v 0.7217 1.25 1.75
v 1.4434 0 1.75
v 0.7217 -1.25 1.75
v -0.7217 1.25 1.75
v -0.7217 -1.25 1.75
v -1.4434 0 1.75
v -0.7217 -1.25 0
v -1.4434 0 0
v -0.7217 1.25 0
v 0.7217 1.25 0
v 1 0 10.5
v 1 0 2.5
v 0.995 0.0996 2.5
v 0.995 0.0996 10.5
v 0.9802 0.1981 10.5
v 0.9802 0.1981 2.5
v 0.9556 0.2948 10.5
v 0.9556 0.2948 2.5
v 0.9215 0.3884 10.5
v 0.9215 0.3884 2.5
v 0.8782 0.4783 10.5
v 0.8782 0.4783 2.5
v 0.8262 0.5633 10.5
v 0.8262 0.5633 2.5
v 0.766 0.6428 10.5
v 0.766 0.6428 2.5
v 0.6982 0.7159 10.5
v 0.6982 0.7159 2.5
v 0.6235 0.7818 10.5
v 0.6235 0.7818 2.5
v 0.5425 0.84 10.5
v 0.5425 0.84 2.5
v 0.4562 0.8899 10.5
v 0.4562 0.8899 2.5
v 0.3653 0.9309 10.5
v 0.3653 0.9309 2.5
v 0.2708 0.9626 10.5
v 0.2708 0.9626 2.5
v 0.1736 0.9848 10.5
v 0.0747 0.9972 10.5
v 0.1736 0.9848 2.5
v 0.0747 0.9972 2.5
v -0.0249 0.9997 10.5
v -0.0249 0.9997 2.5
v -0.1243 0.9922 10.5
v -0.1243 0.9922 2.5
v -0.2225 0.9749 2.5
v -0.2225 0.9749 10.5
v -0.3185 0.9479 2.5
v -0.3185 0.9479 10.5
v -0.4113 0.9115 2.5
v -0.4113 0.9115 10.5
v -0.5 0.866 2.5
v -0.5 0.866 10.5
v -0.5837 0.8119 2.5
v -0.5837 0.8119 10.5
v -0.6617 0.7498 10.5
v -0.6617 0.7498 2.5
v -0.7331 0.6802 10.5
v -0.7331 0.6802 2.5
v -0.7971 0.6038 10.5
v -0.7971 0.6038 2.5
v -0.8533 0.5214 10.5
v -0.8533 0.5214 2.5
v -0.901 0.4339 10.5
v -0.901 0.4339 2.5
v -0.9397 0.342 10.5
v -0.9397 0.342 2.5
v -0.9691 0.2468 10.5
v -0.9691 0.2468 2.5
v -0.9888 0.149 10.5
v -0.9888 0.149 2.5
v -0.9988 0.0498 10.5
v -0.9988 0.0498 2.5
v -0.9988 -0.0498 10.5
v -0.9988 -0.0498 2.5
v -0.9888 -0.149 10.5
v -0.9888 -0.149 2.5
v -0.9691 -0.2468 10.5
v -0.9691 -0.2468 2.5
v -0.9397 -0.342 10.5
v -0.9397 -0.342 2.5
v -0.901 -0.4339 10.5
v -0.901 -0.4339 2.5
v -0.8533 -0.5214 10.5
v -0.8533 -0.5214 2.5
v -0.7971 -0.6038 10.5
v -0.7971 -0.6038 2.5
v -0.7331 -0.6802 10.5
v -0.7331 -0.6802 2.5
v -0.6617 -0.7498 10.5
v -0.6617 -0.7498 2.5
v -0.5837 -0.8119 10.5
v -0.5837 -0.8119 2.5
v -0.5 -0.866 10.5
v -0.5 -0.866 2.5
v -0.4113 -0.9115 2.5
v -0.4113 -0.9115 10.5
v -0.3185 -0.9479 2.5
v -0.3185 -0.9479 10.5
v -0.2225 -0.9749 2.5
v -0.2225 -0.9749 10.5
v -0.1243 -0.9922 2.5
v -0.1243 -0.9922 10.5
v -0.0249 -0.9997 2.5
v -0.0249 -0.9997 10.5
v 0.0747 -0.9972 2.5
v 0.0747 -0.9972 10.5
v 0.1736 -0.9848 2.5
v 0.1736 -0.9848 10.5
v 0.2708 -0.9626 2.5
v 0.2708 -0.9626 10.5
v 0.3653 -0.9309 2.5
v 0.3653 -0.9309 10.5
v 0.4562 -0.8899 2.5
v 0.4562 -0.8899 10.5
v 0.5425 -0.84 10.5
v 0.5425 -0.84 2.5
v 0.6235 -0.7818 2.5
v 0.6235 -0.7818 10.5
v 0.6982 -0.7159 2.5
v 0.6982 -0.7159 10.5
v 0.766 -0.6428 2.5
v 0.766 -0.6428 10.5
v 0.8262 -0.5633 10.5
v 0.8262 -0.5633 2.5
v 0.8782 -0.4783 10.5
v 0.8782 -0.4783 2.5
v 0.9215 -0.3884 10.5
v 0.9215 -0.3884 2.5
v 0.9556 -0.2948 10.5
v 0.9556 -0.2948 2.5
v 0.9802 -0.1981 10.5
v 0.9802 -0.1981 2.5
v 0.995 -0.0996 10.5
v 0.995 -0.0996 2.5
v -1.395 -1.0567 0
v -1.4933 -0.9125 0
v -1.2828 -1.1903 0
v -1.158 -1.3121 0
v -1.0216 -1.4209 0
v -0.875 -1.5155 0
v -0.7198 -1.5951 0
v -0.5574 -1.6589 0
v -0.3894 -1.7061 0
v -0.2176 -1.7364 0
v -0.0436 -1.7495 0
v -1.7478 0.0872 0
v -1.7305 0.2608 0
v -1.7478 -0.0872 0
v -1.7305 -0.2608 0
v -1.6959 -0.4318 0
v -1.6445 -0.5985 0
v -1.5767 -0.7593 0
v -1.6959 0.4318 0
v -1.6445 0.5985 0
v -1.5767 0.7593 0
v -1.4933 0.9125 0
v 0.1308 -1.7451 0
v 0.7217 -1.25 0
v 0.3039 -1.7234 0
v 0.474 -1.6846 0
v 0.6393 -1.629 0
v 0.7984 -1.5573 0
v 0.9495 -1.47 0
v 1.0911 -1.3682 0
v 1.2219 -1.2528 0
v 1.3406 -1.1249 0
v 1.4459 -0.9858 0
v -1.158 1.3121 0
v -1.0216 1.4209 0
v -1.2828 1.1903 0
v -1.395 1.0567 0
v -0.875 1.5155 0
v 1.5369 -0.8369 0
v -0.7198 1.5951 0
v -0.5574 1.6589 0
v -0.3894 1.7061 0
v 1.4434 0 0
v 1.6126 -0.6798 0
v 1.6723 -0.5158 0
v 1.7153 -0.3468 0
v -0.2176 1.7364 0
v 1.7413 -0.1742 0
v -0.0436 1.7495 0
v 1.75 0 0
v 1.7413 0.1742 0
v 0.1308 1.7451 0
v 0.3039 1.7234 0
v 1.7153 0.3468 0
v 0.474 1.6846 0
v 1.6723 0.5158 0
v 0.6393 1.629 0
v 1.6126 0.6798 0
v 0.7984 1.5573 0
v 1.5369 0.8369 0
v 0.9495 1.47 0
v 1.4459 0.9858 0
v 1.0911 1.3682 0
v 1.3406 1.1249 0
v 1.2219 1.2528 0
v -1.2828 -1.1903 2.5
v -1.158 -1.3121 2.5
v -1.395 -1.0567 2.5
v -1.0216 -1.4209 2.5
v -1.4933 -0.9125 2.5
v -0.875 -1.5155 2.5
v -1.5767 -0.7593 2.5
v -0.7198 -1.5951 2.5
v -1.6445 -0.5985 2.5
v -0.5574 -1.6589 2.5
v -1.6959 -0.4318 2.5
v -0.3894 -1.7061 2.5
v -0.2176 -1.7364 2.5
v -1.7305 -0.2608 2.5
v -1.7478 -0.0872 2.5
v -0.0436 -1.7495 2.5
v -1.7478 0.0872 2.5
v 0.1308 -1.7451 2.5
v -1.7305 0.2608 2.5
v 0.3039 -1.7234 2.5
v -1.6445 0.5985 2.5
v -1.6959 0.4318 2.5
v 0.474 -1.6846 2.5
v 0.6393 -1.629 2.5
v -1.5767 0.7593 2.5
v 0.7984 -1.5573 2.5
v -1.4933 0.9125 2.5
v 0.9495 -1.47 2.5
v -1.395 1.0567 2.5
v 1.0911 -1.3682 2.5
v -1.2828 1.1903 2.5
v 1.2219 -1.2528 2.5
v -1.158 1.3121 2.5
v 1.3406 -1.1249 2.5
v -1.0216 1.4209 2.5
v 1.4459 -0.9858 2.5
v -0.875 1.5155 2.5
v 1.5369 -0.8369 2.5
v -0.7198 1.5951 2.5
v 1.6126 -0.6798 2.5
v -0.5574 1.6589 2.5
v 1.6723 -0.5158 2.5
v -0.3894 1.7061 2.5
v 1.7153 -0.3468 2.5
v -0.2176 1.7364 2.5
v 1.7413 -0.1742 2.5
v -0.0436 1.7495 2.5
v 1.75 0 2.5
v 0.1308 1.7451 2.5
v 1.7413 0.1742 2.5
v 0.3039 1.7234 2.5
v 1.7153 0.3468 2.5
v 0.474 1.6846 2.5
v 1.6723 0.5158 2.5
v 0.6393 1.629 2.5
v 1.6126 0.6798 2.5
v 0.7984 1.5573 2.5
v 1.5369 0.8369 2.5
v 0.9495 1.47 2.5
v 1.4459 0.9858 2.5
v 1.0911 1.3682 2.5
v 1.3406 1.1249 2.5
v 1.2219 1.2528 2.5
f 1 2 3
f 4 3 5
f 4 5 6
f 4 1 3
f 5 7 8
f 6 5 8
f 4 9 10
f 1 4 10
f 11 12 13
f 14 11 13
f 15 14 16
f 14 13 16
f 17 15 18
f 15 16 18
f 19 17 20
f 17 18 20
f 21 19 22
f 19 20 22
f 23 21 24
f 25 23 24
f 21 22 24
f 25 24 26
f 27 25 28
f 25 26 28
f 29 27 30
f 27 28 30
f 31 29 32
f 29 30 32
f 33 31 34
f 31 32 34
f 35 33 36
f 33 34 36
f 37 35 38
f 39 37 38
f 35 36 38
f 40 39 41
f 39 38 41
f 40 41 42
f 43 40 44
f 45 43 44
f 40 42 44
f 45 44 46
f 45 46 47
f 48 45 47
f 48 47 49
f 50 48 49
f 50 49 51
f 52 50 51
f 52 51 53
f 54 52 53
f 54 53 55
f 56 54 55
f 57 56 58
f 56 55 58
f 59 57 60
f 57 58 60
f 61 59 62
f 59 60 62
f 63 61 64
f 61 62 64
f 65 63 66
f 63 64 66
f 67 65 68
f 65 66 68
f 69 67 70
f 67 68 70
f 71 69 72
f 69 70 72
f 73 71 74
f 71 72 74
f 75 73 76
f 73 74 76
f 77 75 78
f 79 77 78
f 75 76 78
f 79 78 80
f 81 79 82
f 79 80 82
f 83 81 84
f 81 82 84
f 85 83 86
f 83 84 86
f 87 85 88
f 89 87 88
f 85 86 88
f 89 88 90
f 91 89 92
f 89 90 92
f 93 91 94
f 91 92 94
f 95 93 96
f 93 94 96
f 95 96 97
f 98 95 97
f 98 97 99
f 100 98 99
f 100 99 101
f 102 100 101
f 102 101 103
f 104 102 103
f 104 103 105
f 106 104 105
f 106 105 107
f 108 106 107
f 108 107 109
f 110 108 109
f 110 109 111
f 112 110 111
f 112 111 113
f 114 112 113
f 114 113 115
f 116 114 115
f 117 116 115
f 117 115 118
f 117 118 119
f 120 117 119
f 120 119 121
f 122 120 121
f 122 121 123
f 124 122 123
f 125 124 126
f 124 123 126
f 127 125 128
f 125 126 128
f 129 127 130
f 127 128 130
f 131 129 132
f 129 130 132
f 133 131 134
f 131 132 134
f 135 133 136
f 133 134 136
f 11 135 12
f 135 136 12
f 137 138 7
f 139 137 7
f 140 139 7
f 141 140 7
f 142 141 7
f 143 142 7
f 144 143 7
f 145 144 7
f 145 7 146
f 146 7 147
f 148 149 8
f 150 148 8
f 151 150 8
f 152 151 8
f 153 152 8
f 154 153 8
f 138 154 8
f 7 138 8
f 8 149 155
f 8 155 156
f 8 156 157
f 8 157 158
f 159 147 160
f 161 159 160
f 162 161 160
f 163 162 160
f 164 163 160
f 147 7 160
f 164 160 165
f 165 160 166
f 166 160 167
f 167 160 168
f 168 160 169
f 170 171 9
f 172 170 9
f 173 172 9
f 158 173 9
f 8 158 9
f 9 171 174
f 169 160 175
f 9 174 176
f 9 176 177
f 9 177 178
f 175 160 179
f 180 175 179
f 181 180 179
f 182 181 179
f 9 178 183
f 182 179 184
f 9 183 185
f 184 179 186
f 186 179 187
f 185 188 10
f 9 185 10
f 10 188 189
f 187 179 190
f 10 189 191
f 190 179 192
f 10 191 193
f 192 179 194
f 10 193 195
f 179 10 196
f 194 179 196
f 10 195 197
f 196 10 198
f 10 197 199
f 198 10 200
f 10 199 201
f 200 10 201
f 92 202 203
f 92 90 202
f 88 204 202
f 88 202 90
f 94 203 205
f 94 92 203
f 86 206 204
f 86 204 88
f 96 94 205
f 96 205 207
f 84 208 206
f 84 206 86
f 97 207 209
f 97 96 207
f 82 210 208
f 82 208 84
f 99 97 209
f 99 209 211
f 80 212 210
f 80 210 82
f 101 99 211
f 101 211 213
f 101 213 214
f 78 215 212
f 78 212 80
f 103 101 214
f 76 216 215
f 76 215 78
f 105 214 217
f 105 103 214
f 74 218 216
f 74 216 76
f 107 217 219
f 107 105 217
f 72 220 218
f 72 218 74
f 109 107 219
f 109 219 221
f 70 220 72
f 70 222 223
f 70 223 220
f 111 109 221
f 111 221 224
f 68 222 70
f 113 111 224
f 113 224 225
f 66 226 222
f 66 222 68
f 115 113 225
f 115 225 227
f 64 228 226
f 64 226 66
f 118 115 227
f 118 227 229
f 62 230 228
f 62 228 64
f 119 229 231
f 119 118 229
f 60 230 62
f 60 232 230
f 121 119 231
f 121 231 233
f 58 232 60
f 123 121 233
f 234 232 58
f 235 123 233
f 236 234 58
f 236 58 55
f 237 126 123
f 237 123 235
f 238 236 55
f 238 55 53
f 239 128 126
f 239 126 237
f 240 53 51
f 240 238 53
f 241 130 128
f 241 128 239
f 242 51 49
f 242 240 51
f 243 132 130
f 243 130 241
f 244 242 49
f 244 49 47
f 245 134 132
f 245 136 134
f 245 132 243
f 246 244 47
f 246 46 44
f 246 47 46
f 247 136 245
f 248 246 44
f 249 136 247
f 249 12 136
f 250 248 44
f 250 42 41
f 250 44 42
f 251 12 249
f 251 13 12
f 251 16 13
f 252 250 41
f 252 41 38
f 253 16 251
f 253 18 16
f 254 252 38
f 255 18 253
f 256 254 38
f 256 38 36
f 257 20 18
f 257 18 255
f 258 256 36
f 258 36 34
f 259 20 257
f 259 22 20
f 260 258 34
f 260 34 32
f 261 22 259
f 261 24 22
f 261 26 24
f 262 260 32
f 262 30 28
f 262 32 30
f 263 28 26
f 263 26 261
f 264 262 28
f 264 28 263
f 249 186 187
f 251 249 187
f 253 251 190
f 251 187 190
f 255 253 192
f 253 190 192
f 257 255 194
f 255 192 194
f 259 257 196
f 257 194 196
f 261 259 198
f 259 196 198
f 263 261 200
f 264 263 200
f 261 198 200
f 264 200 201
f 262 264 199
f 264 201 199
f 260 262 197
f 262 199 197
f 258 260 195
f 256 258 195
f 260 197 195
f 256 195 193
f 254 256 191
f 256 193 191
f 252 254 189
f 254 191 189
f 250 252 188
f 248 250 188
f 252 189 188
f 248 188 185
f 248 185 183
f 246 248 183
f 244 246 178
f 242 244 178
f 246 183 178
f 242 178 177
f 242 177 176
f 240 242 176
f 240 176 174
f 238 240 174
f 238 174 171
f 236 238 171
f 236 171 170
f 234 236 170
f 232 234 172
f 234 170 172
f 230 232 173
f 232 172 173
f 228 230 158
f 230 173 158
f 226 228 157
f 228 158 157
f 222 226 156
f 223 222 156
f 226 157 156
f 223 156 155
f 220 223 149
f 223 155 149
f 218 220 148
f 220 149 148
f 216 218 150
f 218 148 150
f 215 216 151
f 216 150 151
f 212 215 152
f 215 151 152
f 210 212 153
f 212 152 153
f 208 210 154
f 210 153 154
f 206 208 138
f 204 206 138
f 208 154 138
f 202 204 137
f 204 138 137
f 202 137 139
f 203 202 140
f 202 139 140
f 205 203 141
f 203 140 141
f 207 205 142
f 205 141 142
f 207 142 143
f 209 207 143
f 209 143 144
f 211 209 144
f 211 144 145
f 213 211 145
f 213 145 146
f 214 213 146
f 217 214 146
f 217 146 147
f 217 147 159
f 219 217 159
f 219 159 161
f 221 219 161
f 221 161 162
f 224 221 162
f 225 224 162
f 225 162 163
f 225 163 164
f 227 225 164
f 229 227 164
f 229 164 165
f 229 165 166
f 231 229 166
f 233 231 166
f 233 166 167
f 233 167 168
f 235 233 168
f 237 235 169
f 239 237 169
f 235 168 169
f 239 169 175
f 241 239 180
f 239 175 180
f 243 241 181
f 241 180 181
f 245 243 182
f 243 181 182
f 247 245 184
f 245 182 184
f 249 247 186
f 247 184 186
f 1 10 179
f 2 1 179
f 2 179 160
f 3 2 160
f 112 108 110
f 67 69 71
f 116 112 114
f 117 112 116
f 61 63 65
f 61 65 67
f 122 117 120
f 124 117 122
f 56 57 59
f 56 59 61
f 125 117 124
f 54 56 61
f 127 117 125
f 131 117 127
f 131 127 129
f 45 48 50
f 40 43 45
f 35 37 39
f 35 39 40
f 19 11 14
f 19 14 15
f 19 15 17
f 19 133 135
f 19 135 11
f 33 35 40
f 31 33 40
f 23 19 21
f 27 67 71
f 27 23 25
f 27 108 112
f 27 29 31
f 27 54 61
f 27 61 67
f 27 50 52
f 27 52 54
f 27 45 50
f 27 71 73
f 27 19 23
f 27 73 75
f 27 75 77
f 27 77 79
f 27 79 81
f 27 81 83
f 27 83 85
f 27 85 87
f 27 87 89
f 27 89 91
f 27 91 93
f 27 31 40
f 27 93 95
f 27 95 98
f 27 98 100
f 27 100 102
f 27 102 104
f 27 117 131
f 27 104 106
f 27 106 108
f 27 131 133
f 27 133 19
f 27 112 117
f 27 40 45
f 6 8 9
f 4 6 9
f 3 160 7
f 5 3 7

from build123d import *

# Parameters (mm, degrees)
CROQUIS1_R              = 1.75
SALIENTE_EXTRUIR1_DEPTH = 2.5
CROQUIS2_R              = 1
SALIENTE_EXTRUIR2_DEPTH = 8
CORTAR_EXTRUIR1_DEPTH   = 1.75


with BuildPart() as part:
    # Croquis1 → Saliente-Extruir1 (new body)
    with BuildSketch(Plane.XY):
        Circle(CROQUIS1_R)
    extrude(amount=SALIENTE_EXTRUIR1_DEPTH)

    # Croquis2 → Saliente-Extruir2 (add)
    with BuildSketch(Plane.XY.offset(2.5)):
        Circle(CROQUIS2_R)
    extrude(amount=SALIENTE_EXTRUIR2_DEPTH)

    # Croquis3 → Cortar-Extruir1 (cut)
    with BuildSketch(Plane(origin=(0, 0, 0), x_dir=(-1, 0, 0), z_dir=(0, 0, -1))):
        Polygon((1.443375673, 0), (0.721687836, 1.25), (-0.721687836, 1.25), (-1.443375673, 0), (-0.721687836, -1.25), (0.721687836, -1.25), align=None)
    extrude(amount=-CORTAR_EXTRUIR1_DEPTH, mode=Mode.SUBTRACT)


solid = part.part
